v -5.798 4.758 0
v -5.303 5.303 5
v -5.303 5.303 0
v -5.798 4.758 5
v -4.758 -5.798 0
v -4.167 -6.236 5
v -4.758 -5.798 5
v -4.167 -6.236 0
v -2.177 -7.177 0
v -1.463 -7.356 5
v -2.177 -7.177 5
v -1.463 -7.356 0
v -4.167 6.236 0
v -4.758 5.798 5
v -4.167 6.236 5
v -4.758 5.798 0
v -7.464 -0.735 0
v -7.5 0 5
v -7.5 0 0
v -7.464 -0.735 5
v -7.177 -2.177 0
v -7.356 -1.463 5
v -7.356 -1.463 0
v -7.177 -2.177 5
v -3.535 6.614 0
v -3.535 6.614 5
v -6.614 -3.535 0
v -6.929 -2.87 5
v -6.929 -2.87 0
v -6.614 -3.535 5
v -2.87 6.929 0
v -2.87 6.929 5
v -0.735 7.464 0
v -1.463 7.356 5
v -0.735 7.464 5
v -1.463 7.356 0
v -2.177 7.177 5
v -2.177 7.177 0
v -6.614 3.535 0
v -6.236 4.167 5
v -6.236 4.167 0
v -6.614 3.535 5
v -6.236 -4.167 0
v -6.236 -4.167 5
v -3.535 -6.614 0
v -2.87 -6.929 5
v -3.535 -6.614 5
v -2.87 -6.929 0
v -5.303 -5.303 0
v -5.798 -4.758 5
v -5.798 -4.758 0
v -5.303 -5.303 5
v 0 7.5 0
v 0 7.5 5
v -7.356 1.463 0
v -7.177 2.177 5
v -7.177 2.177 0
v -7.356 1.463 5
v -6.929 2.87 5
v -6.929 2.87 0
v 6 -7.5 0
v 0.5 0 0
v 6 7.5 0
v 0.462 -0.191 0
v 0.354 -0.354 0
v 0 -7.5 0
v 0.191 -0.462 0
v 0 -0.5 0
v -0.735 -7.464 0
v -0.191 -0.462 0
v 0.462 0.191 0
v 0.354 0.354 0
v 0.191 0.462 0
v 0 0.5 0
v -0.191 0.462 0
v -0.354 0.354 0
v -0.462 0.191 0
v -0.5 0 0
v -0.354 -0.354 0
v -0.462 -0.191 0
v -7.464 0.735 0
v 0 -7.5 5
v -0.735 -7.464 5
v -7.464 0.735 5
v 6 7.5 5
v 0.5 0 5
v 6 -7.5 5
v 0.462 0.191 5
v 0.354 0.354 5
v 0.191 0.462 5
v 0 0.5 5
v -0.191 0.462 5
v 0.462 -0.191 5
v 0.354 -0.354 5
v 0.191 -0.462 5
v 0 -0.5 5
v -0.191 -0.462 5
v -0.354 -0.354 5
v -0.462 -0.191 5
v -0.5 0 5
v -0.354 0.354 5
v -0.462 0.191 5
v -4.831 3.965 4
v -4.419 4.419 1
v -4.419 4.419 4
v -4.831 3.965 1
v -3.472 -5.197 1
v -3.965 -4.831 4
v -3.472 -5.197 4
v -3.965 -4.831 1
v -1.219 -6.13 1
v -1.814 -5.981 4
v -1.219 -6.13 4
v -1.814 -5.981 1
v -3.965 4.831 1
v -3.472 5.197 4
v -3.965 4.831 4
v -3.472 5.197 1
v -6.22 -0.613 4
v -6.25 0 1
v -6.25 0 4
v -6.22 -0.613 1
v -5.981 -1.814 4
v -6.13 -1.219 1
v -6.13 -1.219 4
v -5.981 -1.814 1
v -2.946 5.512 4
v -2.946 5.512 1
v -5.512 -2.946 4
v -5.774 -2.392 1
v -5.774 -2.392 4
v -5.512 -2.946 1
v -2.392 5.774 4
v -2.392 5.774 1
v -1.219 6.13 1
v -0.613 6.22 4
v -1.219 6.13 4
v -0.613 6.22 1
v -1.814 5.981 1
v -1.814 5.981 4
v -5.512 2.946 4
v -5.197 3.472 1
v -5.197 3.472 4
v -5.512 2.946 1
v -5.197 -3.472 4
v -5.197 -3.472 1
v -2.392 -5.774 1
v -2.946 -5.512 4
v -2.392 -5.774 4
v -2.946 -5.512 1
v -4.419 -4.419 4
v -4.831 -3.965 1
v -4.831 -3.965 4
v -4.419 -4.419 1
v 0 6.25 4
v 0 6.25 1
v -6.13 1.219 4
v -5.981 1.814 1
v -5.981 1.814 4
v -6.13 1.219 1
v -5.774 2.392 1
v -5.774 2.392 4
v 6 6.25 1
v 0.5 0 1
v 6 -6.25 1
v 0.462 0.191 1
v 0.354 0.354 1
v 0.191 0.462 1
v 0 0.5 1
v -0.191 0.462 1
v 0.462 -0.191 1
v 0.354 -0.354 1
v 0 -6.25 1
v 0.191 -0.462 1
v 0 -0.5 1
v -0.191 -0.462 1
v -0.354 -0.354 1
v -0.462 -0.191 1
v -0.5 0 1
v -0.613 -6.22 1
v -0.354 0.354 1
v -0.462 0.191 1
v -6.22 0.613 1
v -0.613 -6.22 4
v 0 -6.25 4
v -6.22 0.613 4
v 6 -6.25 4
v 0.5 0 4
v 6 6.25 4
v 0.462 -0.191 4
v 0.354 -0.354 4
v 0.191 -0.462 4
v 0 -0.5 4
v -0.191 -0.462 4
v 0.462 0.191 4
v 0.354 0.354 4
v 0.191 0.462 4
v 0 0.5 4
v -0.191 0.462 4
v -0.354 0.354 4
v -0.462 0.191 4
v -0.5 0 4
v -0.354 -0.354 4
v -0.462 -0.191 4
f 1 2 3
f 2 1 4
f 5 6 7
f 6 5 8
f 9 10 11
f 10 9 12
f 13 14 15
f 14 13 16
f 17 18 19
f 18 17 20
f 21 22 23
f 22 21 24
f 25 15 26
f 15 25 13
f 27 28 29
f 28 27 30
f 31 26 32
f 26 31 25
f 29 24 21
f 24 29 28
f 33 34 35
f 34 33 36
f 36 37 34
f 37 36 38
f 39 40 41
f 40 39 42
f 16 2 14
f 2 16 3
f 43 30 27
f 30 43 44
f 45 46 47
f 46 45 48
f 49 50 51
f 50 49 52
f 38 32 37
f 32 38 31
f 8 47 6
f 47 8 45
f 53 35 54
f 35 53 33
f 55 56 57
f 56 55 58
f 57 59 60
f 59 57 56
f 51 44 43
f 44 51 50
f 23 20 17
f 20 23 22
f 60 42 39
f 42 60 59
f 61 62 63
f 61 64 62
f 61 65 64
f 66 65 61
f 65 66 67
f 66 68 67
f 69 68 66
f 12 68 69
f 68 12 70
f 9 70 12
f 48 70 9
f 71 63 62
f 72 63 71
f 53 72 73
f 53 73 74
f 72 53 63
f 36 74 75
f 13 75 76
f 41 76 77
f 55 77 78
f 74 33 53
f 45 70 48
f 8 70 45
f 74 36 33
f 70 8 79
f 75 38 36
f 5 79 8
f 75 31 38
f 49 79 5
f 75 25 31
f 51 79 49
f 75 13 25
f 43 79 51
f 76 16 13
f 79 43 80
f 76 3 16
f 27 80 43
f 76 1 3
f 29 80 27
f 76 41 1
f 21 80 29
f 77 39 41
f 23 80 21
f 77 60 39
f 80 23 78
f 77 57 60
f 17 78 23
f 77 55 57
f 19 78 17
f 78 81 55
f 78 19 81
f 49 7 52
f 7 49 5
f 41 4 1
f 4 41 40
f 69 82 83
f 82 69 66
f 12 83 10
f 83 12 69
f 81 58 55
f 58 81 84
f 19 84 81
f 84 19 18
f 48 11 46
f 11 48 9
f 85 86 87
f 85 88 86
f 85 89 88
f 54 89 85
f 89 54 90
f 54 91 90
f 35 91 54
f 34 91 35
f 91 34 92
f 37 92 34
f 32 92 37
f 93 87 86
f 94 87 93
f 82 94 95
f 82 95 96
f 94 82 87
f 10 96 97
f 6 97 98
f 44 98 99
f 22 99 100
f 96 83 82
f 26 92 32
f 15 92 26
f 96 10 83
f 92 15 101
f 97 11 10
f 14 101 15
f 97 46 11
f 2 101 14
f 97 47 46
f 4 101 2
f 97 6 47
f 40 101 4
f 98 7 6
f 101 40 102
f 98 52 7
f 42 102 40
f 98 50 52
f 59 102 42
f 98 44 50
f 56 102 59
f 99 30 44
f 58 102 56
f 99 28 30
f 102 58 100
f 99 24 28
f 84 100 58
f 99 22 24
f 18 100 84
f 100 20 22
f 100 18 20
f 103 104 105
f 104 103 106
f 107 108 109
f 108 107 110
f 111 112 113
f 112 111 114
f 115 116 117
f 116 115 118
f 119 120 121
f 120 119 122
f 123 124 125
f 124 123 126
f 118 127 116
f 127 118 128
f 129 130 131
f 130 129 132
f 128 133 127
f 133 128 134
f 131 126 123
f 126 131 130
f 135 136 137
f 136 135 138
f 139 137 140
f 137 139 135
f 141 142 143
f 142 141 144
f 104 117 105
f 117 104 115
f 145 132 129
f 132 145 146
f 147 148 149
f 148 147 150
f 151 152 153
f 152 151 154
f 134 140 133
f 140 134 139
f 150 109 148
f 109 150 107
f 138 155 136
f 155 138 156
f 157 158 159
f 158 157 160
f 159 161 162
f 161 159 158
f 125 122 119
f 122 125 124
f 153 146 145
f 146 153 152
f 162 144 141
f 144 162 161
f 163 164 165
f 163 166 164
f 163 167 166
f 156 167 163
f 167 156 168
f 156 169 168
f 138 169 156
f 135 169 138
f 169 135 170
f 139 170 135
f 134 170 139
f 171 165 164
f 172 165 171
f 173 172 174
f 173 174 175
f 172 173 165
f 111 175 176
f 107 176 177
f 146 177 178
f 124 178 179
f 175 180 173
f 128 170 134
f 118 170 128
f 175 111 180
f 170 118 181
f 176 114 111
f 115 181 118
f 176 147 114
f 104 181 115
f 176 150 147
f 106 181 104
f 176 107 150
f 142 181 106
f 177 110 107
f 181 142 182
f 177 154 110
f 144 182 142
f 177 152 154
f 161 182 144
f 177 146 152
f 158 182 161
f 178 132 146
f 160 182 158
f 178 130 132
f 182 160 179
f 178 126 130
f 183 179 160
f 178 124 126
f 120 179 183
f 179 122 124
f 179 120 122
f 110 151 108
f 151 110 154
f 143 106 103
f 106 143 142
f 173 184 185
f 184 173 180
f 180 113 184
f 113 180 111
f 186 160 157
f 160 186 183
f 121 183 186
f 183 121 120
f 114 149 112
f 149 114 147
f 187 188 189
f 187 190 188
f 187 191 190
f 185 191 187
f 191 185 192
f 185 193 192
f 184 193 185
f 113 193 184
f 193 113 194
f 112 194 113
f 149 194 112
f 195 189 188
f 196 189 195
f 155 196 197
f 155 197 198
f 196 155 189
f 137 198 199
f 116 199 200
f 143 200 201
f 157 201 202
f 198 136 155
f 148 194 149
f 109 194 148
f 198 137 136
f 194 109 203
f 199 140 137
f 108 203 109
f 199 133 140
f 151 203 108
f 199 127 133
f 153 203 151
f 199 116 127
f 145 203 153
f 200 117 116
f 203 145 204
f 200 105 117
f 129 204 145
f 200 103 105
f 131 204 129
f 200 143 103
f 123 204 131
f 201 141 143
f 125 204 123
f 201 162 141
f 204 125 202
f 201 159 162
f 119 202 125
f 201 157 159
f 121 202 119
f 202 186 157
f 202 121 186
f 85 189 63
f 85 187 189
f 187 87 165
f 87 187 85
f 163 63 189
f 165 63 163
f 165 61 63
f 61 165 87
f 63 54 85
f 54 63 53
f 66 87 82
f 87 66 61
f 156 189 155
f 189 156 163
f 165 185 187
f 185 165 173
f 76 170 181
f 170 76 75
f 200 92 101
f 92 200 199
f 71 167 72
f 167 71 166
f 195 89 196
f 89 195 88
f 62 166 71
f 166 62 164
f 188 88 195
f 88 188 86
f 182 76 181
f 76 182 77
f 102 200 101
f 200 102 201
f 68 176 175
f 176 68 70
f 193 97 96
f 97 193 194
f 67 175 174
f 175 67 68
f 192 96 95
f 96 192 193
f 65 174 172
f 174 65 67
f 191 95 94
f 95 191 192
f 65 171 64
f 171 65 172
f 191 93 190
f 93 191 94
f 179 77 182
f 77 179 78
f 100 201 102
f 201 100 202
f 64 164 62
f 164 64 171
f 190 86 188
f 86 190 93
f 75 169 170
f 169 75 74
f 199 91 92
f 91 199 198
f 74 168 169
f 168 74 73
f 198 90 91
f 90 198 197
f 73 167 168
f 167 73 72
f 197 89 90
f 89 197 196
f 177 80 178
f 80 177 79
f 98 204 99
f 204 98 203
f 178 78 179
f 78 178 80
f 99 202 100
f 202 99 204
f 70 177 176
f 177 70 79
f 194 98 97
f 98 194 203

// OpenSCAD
// [FL_INDEX: keywords="openscad, 3d_parametric, Parametric_button_cell_holder, csg_solid" | COT="Parametric OpenSCAD design from 3DCodeverse"]
// Title: Parametric button cell holder

//Battery dimensions in mm

battery_diameter=12;
battery_height=2.5;
tolerance=0.5;
wall_thickness=1;
difference()
{
	union()
	{
		difference()
		{
			cylinder(r=(battery_diameter/2)+tolerance+wall_thickness, h=battery_height+(tolerance)+(2*wall_thickness),$fn=64);

			translate([0,0,wall_thickness])
			cylinder(r=(battery_diameter/2)+(tolerance/2), h=battery_height+(tolerance),$fn=64);
			translate([0,-((battery_diameter/2)+2+tolerance),0])
			cube([battery_diameter+10,battery_diameter+5,battery_height+5]);

		}

		difference()
		{
			translate([0,-((battery_diameter/2)+wall_thickness+tolerance),0])
			cube([battery_diameter/2,battery_diameter+(2*wall_thickness)+(2*tolerance),battery_height+(2*wall_thickness)+tolerance]);

			translate([0,-((battery_diameter/2))-(tolerance/2),wall_thickness])
			cube([battery_diameter+tolerance,battery_diameter+tolerance,battery_height+tolerance]);
		}
	}
	translate([0,0,-1])
	cylinder(r=0.5, h=battery_height+tolerance+10,$fn=16);
}
